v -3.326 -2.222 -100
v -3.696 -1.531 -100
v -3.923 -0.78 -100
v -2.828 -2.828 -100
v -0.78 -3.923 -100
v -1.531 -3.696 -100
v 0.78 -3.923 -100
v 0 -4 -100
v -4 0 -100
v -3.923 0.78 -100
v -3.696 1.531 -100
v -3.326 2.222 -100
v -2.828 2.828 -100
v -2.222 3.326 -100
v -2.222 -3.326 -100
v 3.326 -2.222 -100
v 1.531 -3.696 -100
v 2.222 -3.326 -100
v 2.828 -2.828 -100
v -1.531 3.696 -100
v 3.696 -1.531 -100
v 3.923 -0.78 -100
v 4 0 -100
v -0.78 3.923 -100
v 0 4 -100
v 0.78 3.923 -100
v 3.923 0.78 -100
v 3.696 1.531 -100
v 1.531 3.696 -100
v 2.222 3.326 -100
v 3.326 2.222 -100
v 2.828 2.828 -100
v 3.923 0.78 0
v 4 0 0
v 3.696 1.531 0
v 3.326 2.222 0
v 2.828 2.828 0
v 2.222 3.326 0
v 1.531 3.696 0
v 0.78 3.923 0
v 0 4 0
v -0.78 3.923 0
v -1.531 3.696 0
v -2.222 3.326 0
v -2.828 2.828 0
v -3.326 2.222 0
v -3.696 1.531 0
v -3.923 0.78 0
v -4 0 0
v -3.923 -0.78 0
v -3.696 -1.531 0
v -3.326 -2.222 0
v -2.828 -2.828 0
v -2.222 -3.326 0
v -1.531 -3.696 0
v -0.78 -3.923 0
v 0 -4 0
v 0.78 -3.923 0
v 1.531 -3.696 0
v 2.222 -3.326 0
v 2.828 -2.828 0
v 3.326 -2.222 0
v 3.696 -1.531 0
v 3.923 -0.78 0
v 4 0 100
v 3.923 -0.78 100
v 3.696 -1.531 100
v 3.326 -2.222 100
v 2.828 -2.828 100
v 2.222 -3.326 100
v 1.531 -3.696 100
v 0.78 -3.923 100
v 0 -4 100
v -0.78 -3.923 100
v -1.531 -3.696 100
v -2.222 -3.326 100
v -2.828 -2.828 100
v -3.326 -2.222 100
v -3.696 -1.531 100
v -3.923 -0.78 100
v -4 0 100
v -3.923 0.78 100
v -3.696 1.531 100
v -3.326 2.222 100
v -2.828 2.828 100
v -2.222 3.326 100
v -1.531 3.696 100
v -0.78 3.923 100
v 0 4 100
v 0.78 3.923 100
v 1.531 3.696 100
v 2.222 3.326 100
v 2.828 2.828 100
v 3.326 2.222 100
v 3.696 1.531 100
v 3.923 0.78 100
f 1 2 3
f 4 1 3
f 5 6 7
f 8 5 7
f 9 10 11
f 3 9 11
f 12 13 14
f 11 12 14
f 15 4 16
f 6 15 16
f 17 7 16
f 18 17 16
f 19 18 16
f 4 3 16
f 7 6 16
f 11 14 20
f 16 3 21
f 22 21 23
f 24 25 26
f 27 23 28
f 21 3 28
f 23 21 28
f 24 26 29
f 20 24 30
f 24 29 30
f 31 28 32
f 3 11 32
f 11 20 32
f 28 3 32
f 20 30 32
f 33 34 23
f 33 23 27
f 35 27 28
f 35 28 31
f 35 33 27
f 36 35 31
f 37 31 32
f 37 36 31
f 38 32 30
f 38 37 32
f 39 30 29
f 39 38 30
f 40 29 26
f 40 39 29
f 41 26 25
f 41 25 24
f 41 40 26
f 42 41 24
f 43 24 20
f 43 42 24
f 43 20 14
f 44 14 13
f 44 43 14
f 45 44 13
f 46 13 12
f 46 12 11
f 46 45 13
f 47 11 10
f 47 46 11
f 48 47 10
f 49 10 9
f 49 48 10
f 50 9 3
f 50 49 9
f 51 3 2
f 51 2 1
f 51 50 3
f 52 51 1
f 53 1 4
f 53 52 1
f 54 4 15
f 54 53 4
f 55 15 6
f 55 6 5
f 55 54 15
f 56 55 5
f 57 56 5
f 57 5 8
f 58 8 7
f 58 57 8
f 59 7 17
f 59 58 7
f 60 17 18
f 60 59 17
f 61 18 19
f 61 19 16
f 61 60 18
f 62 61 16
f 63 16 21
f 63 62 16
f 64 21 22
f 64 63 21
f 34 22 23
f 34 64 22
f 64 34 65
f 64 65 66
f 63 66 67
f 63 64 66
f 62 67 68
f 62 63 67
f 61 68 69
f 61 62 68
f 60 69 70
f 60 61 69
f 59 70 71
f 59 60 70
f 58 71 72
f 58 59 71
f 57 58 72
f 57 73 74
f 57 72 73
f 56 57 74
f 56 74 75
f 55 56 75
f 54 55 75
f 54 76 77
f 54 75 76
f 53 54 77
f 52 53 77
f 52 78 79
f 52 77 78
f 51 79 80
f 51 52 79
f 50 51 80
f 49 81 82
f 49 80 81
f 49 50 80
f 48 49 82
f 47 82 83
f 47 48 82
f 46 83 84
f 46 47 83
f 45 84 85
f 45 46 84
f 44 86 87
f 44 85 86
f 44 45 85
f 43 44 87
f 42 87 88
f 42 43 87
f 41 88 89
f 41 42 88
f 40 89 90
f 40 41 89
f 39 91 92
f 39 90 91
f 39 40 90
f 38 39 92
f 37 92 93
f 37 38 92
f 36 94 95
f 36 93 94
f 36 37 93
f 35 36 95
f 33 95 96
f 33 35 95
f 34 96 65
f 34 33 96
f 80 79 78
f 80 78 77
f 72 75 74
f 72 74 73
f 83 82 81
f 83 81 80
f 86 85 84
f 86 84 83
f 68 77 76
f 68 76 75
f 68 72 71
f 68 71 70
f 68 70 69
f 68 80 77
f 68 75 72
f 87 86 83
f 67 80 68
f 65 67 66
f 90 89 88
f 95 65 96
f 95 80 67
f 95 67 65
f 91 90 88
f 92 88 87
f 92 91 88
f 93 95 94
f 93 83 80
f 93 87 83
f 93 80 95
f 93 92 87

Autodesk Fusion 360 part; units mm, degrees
sketch "8mm circle" plane through (0, 0, 0) normal (0, 0, 1) x (1, 0, 0)
  circle A0 centre (0, 0) radius 4
  dimension "d1" = 8
extrude "Extrude1" add sketch "8mm circle" along normal mid plane 200 makes body 1
copy_body "Body->Comp1" bodies 1 removing the originals makes body 2 in component "8mm shaft"
component "8mm shaft" placed x (1, 0, 0) y (0, 1, 0) z (0, 0, 1) at (0, 0, 0)
